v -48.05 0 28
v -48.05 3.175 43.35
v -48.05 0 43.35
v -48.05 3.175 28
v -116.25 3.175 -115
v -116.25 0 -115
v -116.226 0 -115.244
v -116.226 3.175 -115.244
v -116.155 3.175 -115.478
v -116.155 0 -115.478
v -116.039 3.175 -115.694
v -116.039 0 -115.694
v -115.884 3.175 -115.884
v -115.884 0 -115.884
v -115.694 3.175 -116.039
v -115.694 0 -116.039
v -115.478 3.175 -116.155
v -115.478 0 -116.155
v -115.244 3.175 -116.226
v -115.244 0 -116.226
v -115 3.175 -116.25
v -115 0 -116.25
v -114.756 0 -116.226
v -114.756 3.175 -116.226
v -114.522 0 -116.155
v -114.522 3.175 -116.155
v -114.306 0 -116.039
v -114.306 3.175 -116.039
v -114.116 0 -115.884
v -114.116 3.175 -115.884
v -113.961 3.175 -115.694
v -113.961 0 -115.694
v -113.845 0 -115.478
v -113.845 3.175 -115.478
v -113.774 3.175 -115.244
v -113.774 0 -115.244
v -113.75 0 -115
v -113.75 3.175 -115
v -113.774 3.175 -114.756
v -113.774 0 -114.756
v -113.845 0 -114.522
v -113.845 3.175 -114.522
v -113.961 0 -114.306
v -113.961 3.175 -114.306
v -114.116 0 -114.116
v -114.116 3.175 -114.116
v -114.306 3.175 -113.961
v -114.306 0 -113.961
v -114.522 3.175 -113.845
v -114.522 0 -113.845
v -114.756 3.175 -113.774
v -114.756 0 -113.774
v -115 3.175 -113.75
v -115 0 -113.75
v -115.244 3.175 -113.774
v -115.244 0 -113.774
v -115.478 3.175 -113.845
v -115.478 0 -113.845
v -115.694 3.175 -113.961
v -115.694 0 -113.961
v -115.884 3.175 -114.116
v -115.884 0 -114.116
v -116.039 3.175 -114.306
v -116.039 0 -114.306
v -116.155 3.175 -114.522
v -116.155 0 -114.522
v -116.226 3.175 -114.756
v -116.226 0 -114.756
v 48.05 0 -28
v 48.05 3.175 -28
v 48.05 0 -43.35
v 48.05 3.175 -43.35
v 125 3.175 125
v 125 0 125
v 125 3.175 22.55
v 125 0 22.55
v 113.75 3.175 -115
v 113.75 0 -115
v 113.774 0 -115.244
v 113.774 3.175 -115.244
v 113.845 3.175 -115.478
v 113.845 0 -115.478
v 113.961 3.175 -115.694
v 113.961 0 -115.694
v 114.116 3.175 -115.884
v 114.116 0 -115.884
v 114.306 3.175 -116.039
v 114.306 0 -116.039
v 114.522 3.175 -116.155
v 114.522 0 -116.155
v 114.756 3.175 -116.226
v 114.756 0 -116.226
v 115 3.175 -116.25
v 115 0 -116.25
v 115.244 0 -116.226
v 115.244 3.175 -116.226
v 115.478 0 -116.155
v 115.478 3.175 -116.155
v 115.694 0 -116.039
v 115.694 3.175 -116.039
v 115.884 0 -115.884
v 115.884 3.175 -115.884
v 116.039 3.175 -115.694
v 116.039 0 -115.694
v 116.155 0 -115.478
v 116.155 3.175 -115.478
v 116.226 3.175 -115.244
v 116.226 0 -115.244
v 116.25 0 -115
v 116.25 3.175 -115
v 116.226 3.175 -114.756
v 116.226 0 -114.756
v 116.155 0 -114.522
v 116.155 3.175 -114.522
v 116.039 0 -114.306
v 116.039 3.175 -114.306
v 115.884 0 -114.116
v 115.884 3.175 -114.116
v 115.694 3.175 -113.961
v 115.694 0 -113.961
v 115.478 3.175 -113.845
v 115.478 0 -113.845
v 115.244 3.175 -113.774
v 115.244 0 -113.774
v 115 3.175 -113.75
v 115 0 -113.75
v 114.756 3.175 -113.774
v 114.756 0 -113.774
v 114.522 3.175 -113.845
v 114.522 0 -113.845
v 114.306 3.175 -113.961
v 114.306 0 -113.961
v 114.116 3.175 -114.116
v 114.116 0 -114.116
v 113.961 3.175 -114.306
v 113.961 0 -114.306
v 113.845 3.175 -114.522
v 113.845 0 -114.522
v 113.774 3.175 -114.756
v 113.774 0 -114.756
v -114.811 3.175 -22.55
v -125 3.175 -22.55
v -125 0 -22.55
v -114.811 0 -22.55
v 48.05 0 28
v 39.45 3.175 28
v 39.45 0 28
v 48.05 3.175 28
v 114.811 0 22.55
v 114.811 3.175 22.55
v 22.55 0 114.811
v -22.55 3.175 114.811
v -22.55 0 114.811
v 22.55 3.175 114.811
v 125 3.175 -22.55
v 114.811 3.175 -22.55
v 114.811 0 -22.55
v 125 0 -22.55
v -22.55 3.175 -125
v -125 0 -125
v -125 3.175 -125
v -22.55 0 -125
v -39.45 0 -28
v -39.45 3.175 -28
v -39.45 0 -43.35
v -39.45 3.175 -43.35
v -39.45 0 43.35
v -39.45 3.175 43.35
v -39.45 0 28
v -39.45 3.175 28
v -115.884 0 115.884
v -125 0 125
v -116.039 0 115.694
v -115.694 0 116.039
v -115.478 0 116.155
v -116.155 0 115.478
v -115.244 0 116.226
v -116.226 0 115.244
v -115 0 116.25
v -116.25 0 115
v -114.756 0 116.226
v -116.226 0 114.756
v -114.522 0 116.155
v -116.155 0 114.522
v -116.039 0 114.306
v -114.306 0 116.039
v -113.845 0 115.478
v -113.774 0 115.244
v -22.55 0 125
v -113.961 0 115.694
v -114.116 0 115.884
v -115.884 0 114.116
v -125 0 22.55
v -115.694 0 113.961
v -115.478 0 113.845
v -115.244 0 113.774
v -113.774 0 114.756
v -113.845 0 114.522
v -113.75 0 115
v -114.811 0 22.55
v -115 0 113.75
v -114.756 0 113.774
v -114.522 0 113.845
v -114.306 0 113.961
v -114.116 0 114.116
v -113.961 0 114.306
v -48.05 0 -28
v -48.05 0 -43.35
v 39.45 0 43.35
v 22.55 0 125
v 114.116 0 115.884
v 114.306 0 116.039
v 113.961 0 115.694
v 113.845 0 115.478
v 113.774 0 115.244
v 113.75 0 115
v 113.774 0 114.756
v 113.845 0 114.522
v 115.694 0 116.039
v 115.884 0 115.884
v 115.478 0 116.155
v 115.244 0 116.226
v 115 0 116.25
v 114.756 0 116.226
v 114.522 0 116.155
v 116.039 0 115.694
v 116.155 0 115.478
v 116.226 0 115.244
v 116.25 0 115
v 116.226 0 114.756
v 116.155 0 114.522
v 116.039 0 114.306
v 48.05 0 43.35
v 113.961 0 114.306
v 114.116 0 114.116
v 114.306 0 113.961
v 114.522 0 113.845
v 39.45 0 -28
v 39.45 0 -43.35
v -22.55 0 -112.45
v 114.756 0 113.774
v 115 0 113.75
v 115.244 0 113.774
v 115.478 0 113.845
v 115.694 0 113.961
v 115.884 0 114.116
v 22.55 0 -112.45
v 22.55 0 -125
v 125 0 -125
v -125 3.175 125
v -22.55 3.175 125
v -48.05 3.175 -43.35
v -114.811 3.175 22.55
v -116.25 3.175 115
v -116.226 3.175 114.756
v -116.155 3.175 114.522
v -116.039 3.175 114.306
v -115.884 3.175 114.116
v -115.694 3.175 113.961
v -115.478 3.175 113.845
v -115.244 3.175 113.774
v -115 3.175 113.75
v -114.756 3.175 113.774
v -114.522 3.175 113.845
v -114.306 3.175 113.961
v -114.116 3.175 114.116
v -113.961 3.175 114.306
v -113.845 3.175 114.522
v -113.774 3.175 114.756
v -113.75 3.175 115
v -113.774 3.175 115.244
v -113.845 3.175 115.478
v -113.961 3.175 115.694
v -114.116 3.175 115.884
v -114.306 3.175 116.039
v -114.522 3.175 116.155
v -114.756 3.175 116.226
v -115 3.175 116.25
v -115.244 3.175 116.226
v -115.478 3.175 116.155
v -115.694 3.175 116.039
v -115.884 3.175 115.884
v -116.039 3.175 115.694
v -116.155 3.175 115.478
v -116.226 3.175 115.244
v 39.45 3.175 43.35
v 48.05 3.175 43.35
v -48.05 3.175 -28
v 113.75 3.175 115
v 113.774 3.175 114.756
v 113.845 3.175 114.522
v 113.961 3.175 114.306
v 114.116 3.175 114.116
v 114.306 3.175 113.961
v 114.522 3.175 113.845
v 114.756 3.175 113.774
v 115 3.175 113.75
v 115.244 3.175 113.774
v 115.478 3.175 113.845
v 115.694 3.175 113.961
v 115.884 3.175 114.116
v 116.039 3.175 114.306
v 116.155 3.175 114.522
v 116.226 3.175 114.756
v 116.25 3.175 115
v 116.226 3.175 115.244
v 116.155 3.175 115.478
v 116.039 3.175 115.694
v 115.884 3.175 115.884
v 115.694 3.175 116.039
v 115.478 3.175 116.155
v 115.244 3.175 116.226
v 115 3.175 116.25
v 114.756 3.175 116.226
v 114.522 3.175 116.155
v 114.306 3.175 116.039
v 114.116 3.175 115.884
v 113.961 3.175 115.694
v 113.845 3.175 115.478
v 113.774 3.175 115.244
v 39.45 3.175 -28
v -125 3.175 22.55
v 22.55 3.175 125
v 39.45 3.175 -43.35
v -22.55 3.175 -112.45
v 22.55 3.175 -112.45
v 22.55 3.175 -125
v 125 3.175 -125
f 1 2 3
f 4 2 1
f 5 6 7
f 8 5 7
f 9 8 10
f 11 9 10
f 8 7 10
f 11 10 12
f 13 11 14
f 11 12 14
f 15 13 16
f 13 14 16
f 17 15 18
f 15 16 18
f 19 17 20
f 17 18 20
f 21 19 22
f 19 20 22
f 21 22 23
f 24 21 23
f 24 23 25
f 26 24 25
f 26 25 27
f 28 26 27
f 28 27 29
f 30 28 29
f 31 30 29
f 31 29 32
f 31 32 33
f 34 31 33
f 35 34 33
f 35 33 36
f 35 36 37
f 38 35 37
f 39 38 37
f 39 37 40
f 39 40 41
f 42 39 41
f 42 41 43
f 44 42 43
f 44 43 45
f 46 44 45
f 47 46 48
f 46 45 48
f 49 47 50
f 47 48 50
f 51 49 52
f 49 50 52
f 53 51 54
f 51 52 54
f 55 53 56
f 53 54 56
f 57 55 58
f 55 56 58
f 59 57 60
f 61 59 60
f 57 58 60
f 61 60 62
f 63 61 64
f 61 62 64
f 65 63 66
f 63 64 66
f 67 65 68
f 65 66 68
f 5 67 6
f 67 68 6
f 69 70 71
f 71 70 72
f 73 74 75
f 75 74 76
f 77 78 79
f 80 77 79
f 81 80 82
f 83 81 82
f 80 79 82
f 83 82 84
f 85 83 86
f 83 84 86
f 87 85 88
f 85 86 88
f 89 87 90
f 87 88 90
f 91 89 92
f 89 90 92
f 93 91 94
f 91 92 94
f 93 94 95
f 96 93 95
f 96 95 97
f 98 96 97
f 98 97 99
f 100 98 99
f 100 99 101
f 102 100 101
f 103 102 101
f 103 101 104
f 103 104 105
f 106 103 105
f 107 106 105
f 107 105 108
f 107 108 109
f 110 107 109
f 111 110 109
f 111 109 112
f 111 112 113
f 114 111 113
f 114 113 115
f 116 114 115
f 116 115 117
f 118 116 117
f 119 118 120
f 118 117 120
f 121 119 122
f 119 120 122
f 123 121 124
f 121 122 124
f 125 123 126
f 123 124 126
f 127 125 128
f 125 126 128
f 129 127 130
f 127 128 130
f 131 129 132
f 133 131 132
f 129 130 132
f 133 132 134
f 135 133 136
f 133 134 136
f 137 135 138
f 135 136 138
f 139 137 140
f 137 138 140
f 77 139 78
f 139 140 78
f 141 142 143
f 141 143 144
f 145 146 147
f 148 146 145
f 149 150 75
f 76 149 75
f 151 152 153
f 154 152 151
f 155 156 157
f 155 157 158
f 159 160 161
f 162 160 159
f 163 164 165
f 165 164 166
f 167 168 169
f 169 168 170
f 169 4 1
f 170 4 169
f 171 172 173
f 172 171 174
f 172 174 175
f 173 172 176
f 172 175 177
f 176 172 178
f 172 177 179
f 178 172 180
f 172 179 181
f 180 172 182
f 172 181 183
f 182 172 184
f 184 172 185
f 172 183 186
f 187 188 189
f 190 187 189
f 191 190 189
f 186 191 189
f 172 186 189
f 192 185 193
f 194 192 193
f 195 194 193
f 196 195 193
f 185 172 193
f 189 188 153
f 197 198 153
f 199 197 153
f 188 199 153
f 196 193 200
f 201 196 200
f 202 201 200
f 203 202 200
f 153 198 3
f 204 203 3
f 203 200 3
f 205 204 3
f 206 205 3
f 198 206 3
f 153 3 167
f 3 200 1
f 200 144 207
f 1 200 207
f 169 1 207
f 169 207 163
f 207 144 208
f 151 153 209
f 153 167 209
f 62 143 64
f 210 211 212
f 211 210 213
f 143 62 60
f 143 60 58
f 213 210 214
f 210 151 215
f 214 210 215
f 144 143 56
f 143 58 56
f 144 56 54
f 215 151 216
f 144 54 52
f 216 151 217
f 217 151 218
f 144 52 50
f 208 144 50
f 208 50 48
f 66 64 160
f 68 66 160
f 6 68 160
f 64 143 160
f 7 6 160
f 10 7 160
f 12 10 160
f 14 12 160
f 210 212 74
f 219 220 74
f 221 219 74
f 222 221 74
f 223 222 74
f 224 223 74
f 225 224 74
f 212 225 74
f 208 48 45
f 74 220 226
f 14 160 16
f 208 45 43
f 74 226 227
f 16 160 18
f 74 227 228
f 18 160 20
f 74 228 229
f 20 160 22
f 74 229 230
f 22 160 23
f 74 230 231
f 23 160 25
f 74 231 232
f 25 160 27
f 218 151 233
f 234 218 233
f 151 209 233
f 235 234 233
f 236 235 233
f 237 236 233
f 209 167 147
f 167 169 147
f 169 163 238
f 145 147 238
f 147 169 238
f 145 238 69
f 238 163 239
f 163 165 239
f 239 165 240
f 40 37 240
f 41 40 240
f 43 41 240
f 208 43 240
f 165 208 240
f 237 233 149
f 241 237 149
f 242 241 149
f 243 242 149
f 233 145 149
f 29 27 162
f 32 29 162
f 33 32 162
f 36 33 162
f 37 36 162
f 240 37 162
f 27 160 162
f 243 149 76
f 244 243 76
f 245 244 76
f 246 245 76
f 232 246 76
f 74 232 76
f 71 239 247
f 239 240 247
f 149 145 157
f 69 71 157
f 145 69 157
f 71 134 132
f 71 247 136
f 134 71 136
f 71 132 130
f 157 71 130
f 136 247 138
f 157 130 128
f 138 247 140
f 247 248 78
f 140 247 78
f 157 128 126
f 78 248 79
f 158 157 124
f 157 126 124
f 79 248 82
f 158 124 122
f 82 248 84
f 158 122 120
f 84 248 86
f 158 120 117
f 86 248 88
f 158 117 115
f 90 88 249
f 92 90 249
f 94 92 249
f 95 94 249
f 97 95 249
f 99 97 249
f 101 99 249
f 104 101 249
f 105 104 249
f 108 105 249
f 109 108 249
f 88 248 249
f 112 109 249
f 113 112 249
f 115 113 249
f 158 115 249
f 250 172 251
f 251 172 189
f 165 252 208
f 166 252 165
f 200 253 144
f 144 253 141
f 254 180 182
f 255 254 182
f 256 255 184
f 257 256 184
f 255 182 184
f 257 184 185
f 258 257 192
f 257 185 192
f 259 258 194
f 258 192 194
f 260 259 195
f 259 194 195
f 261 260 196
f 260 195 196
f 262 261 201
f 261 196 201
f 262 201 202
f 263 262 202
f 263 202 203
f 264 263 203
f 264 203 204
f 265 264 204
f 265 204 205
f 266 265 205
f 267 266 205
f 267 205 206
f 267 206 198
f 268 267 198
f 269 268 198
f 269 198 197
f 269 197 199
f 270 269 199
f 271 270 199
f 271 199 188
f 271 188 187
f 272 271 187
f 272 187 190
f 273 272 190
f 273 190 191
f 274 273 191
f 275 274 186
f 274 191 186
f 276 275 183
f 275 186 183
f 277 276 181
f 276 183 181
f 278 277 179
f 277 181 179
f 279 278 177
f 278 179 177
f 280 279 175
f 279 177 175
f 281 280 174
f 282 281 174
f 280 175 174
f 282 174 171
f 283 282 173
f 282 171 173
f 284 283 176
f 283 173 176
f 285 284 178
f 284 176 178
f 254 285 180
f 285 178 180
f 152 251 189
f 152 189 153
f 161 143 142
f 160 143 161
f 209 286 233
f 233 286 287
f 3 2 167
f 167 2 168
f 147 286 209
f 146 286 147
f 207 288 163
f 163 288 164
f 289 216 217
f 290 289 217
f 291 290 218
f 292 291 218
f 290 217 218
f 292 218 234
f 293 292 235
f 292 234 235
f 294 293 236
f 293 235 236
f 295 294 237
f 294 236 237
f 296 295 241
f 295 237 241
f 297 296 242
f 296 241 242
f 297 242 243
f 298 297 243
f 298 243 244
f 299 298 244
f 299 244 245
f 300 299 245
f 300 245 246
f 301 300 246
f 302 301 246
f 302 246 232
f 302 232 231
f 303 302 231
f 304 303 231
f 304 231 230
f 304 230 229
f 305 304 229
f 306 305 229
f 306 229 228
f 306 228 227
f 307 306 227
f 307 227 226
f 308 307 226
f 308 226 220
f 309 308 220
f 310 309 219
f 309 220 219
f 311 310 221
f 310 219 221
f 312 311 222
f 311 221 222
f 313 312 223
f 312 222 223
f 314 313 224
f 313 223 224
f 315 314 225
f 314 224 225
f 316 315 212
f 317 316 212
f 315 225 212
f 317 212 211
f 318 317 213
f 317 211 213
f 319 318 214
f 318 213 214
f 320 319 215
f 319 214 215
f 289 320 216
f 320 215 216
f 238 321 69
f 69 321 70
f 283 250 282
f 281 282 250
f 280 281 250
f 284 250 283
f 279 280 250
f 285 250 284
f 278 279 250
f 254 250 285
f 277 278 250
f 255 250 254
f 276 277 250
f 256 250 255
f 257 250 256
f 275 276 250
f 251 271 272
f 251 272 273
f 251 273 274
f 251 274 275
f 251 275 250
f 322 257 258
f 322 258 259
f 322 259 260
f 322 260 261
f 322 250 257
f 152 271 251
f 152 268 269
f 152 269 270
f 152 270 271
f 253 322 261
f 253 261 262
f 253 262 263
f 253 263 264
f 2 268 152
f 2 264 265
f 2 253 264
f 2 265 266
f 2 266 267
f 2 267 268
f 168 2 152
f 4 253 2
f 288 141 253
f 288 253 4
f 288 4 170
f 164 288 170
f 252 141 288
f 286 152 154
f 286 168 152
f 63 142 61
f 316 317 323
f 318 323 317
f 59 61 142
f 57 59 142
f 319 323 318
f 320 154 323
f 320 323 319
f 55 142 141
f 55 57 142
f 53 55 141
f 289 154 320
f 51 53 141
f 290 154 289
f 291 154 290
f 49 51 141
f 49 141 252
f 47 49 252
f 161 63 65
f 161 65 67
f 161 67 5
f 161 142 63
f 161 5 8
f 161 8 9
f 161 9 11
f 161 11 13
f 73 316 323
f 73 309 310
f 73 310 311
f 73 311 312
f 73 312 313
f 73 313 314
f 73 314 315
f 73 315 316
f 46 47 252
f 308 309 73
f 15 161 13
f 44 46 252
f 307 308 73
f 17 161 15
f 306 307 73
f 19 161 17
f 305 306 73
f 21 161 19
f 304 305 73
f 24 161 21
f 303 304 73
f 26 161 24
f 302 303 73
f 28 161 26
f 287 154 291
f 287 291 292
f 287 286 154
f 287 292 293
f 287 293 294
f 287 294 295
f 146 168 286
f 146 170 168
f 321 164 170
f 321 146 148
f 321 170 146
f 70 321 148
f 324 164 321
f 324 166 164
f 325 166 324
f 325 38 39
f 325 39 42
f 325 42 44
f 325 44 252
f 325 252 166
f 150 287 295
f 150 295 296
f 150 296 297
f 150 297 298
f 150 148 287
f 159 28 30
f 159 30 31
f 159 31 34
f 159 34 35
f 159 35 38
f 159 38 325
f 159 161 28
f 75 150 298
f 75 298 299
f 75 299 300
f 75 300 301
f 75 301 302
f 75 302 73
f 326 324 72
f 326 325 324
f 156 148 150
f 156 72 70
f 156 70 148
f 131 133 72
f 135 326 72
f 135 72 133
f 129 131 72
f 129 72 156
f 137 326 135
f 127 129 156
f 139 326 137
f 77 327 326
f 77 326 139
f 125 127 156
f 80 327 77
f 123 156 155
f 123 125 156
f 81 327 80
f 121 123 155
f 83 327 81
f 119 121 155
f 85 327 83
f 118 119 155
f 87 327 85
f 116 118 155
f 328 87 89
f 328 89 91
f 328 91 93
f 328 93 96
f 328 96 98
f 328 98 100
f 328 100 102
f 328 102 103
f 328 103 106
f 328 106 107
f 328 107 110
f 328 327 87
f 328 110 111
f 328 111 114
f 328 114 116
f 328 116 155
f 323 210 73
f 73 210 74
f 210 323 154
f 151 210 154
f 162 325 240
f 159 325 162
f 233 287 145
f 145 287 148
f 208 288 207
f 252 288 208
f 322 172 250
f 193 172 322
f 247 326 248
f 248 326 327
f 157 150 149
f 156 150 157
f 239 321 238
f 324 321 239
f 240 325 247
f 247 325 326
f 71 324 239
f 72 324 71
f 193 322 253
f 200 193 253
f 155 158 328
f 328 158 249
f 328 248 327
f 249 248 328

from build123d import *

# Parameters (mm, degrees)
SKETCH2_W          = 250
SKETCH2_H          = 250
BASE_DEPTH         = 3.175
SKETCH3_W          = 8.6
SKETCH3_H          = 15.35
HOLES_DEPTH        = 10
SKETCH4_W          = 45.1
SKETCH4_H          = 25.1
SKETCH4_W_2        = 20.378913316
SKETCH4_H_2        = 45.1
SKETCH4_H_3        = 20.378913316
JIGSAW_DEPTH       = 10
STANDOFF_HOLES_D   = 2.5
STANDOFF_HOLES_2_D = 2.5


with BuildPart() as part:
    # Sketch2 → Base (new body)
    with BuildSketch(Plane(origin=(0, 0, 0), x_dir=(1, 0, 0), z_dir=(0, 1, 0))):
        Rectangle(SKETCH2_W, SKETCH2_H)
    extrude(amount=BASE_DEPTH)

    # Sketch3 → Holes (cut)
    with BuildSketch(Plane(origin=(0, 3.175, 0), x_dir=(1, 0, 0), z_dir=(0, 1, 0))):
        with Locations((-43.75, 35.675)):
            Rectangle(SKETCH3_W, SKETCH3_H)
        with Locations((-43.75, -35.675)):
            Rectangle(SKETCH3_W, SKETCH3_H)
        with Locations((43.75, -35.675)):
            Rectangle(SKETCH3_W, SKETCH3_H)
        with Locations((43.75, 35.675)):
            Rectangle(SKETCH3_W, SKETCH3_H)
    extrude(amount=-HOLES_DEPTH, mode=Mode.SUBTRACT)

    # Sketch4 → Jigsaw (cut)
    with BuildSketch(Plane(origin=(0, 3.175, 0), x_dir=(1, 0, 0), z_dir=(0, 1, 0))):
        with Locations((0, 125)):
            Rectangle(SKETCH4_W, SKETCH4_H)
        with Locations((-125, 0)):
            Rectangle(SKETCH4_W_2, SKETCH4_H_2)
        with Locations((125, 0)):
            Rectangle(SKETCH4_W_2, SKETCH4_H_2)
        with Locations((0, -125)):
            Rectangle(SKETCH4_W, SKETCH4_H_3)
    extrude(amount=-JIGSAW_DEPTH, mode=Mode.SUBTRACT)

    # Standoff Holes (through all)
    with Locations(Plane(origin=(0, 3.175, 0), x_dir=(1, 0, 0), z_dir=(0, 1, 0))):
        with Locations((-115, 115)):
            Hole(STANDOFF_HOLES_D / 2)

    # Standoff Holes 2 (through all)
    with Locations(Plane(origin=(0, 3.175, 0), x_dir=(1, 0, 0), z_dir=(0, 1, 0))):
        with Locations((115, 115), (115, -115), (-115, -115)):
            Hole(STANDOFF_HOLES_2_D / 2)


solid = part.part
